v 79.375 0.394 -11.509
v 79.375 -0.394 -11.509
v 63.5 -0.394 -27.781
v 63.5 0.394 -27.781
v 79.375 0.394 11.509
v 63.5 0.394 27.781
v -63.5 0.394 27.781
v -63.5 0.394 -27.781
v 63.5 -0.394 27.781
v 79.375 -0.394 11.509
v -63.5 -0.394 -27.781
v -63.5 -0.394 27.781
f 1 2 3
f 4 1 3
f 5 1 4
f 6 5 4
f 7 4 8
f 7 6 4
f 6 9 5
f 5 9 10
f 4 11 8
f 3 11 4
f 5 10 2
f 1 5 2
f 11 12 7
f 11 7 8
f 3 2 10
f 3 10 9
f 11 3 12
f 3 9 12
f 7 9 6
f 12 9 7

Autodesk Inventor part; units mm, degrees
ref_plane "YZ Plane" through (0, 0, 0) normal (1, 0, 0) x (0, 1, 0)
ref_plane "XZ Plane" through (0, 0, 0) normal (0, 1, 0) x (-1, 0, 0)
ref_plane "XY Plane" through (0, 0, 0) normal (0, 0, 1) x (1, 0, 0)
sketch "Sketch1" plane through (0, 0, 0) normal (0, 1, 0) x (-1, 0, 0)
  line L0 (-60.5593, 27.4889) -> (62.6411, -28.4339) construction
  line L1 (62.6424, 27.1286) -> (-64.3576, -27.8714) construction
  line L2 (-77.4954, -16.5) -> (-44.4954, -16.5) construction
  line L3 (-63.5, 27.7812) -> (63.5, 27.7812)
  line L4 (63.5, 27.7812) -> (63.5, -27.7812)
  line L5 (63.5, -27.7812) -> (-63.5, -27.7812)
  line L6 (-63.5, 27.7812) -> (63.5, -27.7812) construction
  line L7 (63.5, 27.7812) -> (-63.5, -27.7812) construction
  line L8 (-63.5, 11.5094) -> (63.5, 11.5094)
  line L9 (63.5, 11.5094) -> (63.5, -11.5094)
  line L10 (63.5, -11.5094) -> (-63.5, -11.5094)
  line L11 (-63.5, 11.5094) -> (63.5, -11.5094) construction
  line L12 (63.5, 11.5094) -> (-63.5, -11.5094) construction
  line L13 (-79.375, 11.5094) -> (-79.375, -11.5094)
  line L14 (-63.5, 27.7812) -> (-79.375, 11.5094)
  line L15 (-79.375, -11.5094) -> (-63.5, -27.7812)
  point P0 (0, 0)
  dimension "d1" = 55.5625
  dimension "d6" = 127
  dimension "d7" = 55.5625
  dimension "d8" = 127
  dimension "d9" = 23.0188
extrude "Extrusion1" add sketch "Sketch1" along normal mid plane 0.7874
properties part number "140x55mm-PCB"
